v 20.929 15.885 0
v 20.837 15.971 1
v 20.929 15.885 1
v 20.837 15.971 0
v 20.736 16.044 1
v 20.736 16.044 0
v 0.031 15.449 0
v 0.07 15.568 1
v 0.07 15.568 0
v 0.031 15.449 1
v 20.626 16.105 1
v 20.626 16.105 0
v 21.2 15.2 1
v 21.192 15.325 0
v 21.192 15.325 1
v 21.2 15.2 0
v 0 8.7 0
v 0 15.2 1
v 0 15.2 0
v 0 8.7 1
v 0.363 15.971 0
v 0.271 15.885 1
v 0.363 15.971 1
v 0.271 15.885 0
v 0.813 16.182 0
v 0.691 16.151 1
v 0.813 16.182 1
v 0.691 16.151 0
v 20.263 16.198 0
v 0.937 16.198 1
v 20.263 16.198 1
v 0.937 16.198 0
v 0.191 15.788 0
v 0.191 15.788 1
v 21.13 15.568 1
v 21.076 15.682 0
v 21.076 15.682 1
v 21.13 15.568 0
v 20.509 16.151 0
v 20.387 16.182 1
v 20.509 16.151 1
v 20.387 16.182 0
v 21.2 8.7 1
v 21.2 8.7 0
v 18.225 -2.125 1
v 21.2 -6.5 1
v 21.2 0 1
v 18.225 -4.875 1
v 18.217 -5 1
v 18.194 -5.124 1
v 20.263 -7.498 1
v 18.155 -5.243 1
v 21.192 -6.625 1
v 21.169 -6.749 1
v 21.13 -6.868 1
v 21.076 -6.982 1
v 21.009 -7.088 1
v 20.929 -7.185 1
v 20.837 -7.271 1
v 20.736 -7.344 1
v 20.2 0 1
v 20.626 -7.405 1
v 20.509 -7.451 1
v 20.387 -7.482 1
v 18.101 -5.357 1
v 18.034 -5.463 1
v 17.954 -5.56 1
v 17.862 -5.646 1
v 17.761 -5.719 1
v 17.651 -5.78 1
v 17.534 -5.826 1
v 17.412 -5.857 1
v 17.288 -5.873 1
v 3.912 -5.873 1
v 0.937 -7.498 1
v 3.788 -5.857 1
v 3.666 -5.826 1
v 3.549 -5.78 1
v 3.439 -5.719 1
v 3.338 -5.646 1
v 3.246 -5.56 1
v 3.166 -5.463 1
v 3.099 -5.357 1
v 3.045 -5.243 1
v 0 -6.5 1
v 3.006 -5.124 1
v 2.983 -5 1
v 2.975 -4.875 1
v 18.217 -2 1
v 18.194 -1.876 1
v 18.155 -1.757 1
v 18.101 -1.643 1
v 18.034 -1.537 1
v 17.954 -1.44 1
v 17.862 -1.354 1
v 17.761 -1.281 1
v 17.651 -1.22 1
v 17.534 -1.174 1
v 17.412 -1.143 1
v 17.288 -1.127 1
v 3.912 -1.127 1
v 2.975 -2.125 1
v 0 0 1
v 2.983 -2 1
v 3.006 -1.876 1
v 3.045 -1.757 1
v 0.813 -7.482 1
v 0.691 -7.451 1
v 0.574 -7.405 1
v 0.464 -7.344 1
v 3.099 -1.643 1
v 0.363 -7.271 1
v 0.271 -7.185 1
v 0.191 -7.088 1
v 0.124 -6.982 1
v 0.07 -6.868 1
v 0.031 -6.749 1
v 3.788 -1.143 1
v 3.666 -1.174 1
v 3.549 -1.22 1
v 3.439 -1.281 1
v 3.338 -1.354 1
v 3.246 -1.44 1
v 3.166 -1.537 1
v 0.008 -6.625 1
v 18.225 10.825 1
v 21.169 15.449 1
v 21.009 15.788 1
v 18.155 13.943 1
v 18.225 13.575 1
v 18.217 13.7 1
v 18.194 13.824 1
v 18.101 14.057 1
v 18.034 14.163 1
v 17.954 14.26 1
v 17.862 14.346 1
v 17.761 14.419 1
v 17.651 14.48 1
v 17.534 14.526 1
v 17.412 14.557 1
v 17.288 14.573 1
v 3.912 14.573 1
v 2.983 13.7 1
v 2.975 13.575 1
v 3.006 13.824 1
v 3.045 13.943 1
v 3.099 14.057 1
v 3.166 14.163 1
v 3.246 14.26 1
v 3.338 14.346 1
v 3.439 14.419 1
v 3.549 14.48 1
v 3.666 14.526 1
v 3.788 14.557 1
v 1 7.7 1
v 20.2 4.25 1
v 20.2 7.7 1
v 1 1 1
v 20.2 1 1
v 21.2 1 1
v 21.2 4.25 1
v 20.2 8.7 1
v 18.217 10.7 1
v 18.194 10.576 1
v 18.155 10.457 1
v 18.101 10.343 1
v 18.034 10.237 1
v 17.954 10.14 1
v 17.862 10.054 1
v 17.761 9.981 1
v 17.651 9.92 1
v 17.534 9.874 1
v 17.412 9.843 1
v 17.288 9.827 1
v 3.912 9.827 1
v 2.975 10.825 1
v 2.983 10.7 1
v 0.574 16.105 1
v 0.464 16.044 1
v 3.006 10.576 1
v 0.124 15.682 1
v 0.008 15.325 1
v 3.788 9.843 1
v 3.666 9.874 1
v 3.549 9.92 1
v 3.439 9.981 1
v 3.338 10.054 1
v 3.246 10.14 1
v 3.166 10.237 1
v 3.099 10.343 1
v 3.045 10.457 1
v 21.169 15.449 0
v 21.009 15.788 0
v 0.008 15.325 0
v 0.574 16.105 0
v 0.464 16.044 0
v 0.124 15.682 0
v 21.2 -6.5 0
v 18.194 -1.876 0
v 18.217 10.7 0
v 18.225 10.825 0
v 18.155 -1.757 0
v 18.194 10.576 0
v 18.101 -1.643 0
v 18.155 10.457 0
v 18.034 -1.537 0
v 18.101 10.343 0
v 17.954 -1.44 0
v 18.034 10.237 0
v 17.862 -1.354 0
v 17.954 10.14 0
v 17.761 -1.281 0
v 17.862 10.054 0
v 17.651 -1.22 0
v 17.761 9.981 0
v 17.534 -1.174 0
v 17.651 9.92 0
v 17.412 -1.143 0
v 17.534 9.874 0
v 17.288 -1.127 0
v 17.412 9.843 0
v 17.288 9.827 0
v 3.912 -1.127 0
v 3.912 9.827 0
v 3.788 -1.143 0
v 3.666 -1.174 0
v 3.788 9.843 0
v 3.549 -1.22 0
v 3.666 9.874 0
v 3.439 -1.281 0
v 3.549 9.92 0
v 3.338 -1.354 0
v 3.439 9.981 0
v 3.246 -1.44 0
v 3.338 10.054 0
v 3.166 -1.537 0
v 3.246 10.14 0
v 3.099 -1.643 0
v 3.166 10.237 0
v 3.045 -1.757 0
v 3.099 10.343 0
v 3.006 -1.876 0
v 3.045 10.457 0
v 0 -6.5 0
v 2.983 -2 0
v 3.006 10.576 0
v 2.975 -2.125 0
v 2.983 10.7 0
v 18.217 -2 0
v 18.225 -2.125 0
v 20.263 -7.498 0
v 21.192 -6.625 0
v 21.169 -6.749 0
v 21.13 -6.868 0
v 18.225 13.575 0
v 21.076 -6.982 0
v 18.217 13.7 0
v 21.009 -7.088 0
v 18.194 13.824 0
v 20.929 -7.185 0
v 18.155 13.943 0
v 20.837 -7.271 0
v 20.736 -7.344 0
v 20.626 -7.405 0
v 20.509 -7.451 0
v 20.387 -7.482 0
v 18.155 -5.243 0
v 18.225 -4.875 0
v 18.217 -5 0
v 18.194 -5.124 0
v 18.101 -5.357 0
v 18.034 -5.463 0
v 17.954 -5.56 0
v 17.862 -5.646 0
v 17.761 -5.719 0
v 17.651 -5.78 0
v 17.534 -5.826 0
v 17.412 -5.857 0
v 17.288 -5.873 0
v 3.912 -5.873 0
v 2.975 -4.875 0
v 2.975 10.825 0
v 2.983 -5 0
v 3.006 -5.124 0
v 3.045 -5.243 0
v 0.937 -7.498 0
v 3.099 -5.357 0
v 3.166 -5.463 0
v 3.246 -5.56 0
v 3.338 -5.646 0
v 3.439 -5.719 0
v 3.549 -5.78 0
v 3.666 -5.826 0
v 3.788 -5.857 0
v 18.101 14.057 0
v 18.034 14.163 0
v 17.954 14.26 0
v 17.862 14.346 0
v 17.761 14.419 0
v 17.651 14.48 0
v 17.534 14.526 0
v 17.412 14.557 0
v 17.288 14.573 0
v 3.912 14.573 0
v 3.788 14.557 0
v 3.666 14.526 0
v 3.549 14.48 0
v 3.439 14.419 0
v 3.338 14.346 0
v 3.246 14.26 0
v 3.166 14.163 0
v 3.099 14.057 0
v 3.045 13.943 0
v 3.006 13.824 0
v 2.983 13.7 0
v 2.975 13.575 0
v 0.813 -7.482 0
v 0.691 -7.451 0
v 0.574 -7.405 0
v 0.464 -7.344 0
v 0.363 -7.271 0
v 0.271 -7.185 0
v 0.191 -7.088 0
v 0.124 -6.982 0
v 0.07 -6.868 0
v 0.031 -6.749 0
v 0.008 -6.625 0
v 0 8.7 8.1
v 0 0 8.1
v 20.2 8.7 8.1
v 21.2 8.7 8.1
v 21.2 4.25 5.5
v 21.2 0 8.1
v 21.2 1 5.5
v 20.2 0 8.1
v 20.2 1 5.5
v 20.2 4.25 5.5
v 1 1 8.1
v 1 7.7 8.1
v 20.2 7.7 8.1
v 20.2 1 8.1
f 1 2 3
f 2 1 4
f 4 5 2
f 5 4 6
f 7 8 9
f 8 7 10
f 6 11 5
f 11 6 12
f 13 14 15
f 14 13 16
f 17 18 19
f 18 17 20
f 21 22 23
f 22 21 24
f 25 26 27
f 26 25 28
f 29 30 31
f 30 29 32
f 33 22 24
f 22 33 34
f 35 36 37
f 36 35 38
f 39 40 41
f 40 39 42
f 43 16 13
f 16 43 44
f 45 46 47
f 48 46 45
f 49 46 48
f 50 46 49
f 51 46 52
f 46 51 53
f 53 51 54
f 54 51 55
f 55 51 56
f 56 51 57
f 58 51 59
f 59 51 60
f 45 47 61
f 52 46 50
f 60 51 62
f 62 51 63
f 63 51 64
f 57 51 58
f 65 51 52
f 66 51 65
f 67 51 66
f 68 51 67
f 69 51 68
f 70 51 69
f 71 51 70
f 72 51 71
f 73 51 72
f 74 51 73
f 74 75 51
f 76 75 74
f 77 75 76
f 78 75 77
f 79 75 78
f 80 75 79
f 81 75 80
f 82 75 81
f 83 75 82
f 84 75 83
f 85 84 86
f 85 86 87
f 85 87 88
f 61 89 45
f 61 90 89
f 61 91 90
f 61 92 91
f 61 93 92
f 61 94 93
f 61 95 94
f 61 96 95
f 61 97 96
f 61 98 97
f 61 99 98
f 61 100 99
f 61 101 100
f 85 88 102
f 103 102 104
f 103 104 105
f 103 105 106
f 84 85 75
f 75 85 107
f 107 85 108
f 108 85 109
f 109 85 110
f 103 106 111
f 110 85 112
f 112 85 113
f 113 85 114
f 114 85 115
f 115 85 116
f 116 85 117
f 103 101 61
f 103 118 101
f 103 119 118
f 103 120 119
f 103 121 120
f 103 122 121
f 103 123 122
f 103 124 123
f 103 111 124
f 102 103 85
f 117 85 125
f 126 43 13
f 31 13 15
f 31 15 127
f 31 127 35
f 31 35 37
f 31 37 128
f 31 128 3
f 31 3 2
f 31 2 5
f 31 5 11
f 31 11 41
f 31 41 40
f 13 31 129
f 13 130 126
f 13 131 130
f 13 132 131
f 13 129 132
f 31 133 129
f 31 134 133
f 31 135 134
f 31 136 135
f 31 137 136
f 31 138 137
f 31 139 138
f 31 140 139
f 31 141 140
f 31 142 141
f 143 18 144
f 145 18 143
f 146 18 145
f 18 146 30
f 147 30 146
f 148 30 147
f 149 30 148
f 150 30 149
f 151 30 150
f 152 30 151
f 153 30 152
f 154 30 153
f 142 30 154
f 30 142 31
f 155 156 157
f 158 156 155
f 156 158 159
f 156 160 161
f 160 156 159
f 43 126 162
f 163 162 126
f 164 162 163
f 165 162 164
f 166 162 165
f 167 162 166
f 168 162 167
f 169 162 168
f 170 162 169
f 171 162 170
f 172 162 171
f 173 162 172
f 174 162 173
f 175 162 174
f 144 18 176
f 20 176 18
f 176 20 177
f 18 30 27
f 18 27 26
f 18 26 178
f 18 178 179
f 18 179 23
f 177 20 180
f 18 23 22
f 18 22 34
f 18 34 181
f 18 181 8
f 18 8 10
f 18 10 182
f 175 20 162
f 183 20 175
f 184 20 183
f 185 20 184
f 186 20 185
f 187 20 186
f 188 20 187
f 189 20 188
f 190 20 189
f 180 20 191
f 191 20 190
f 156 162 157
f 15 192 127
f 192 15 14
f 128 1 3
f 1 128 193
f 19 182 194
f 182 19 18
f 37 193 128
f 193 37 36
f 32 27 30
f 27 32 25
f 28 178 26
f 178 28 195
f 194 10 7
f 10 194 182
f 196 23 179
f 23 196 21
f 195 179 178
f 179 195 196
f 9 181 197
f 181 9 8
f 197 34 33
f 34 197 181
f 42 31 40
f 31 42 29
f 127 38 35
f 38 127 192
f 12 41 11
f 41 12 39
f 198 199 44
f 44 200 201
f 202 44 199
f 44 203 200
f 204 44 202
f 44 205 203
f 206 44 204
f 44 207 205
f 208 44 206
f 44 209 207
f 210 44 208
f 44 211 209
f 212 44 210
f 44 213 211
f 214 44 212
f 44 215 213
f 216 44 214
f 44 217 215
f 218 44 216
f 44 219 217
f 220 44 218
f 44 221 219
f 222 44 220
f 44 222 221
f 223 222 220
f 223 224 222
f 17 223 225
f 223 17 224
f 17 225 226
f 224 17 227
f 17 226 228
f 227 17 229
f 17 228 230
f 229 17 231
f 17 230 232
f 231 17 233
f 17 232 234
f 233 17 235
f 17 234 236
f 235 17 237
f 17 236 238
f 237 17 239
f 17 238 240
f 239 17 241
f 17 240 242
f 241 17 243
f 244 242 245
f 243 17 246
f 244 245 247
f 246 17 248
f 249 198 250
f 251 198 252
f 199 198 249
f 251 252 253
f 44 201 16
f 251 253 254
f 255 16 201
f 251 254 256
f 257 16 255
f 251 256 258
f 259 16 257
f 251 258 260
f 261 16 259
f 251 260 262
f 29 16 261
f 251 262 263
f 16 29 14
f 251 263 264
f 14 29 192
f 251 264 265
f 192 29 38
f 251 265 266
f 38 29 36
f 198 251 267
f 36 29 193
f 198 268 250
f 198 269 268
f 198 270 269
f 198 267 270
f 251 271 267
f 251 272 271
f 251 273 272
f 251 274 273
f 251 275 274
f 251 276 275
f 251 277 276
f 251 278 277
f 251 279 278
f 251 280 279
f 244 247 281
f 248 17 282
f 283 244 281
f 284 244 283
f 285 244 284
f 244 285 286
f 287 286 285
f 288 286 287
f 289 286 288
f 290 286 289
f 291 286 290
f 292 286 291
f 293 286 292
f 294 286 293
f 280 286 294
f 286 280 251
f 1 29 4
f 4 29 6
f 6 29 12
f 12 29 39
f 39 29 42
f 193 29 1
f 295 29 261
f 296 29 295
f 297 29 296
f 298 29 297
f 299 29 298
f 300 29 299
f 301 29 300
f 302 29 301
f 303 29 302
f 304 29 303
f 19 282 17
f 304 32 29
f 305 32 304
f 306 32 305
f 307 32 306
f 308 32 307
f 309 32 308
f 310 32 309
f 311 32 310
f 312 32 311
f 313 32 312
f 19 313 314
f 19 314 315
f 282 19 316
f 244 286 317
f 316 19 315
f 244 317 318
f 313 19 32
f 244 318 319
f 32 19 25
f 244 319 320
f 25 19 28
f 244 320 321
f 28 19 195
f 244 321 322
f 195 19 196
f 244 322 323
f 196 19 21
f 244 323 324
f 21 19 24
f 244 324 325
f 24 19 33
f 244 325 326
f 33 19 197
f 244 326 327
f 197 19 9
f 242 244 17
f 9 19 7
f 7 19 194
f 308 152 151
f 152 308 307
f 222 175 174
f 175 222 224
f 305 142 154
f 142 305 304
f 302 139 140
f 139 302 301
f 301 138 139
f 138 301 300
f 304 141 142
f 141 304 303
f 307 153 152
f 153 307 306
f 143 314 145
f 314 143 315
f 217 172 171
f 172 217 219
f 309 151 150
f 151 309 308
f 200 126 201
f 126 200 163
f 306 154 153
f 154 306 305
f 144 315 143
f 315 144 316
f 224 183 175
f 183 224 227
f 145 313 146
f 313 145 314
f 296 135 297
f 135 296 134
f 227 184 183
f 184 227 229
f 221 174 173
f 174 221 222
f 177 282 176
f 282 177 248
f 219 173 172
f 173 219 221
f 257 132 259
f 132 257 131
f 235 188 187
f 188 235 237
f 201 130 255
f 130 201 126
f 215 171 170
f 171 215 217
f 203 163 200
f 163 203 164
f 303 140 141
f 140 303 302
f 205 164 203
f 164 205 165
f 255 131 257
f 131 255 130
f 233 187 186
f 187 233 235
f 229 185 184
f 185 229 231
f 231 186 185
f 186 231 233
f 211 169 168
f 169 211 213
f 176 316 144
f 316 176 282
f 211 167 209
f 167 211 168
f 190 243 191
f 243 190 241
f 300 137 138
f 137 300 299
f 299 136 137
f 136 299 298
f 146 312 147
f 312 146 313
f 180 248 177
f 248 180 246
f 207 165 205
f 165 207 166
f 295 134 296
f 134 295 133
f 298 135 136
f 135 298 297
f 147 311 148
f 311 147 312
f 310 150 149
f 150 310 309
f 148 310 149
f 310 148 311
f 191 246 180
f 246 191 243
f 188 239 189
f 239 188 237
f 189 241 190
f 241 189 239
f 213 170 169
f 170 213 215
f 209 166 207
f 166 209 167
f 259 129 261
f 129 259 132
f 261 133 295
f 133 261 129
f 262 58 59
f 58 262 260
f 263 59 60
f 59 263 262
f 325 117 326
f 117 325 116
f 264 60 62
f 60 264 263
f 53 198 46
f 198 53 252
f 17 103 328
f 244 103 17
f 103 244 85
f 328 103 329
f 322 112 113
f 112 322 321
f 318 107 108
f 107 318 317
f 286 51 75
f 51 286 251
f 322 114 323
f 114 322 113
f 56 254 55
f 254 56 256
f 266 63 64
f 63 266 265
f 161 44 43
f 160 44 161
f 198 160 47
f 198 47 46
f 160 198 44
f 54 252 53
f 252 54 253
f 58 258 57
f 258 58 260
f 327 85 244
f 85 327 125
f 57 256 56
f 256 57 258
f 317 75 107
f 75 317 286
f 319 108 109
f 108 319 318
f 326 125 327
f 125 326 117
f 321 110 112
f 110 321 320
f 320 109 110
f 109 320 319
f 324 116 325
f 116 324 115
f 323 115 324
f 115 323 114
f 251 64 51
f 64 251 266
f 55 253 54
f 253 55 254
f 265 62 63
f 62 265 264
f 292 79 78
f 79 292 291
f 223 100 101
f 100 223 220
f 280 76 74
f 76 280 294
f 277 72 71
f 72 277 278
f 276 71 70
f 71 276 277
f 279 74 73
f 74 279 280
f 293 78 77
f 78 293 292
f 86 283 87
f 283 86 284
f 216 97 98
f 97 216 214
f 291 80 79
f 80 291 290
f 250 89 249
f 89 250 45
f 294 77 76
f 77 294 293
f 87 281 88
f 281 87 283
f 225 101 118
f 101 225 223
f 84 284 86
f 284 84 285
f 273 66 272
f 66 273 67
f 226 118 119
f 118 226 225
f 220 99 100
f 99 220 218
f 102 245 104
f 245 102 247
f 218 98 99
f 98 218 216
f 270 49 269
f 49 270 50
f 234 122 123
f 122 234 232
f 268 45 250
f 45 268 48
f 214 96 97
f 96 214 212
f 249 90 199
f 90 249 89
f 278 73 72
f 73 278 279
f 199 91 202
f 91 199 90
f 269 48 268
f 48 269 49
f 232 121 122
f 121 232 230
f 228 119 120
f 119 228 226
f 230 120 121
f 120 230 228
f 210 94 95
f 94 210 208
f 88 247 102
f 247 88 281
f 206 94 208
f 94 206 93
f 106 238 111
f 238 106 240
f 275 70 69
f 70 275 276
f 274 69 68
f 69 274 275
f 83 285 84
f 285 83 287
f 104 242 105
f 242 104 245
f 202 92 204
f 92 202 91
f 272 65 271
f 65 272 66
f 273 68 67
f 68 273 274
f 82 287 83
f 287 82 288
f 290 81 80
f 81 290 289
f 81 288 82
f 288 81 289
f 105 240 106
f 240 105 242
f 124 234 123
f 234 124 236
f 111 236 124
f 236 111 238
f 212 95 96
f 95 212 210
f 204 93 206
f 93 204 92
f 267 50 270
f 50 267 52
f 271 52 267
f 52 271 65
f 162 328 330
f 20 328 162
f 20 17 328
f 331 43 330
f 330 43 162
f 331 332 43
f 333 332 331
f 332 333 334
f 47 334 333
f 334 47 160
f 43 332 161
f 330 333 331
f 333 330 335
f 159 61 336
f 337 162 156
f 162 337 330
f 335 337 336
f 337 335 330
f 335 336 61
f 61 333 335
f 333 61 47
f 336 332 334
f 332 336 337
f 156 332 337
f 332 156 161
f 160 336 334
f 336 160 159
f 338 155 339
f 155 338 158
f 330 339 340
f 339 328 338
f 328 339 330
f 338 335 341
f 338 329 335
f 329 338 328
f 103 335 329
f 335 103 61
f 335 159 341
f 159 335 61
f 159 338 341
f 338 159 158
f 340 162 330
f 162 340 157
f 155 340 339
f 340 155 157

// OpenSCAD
/*motor_length = 16;
motor_width = 6;
motor_height = 5;*/

motor_length = 19;
motor_width = 6.5;
motor_height = 6;

case_strength = 1;

case_margin = 0.1;

module mounting_plate()
{
	union()
	{
		difference()
		{
			translate([case_strength, 0, 0])
			minkowski($fn=50)
			{
				cube([motor_length + case_strength * 2 + case_margin * 2 - case_strength*2, motor_width, case_strength/2]);
				cylinder(r=case_strength, h=case_strength/2);
			}

			translate([(motor_length * 0.125) + case_strength * 1.5 + case_margin, motor_width/4 + case_strength/2, -case_strength/2])
			minkowski($fn=50)
			{
				cube([motor_length * 0.75 - case_strength, motor_width/2 - case_strength/2, case_strength * 2]);
				cylinder(r=case_strength, h=case_strength);
			}
		}
	}
}

module case()
{
	union() {
		// bottom
		union() {
			cube([motor_length + case_strength * 2 + case_margin * 2, motor_width + case_strength * 2 + case_margin * 2, case_strength]);

			translate([0, motor_width + case_strength * 2 + case_margin * 2, 0])
			mounting_plate();

			translate([0, 0, 0])
			scale([1, -1, 1])
			mounting_plate();
		}

		// front wall
		translate([0, 0, case_strength])
		cube([case_strength, motor_width + case_strength * 2 + case_margin * 2, motor_height + case_strength + case_margin]);

		// back wall
		translate([motor_length + case_strength + case_margin * 2, 0, case_strength])
		difference()
		{
			cube([case_strength, motor_width + case_strength * 2 + case_margin * 2, motor_height + case_strength + case_margin]);

			translate([-case_strength/2, case_strength, 0])
			cube([case_strength*2, motor_width/2, motor_height * 0.75]);
		}

		// side wall right
		translate([case_strength, 0, case_strength])
		cube([motor_length + case_margin * 2, case_strength, motor_height + case_strength + case_margin]);

		// side wall left
		translate([case_strength, motor_width + case_strength + case_margin * 2, case_strength])
		cube([motor_length + case_margin * 2, case_strength, motor_height + case_strength + case_margin]);
	}
}

module case_cap()
{
	union() {
		// Top part
		translate([0, 0, case_strength])
		cube([motor_length + case_strength * 2 + case_margin * 2, motor_width + case_strength * 2 + case_margin * 2, case_strength]);

		// insert
		translate([case_strength + case_margin, case_strength + case_margin, case_margin])
		cube([motor_length, motor_width, case_strength - case_margin]);
	}
}

module motor_dummy()
{
	cube([motor_length, motor_width, motor_height]);
}

case();

//translate([0, 0, motor_height + case_strength + case_margin * 2])
//%case_cap();

//rotate([180, 0, 0])
//translate([0, -(motor_width + case_strength * 2 + case_margin * 2), -(case_strength*2)])
//case_cap();

//translate([case_strength + case_margin, case_strength + case_margin, case_strength + case_margin])
//motor_dummy();
